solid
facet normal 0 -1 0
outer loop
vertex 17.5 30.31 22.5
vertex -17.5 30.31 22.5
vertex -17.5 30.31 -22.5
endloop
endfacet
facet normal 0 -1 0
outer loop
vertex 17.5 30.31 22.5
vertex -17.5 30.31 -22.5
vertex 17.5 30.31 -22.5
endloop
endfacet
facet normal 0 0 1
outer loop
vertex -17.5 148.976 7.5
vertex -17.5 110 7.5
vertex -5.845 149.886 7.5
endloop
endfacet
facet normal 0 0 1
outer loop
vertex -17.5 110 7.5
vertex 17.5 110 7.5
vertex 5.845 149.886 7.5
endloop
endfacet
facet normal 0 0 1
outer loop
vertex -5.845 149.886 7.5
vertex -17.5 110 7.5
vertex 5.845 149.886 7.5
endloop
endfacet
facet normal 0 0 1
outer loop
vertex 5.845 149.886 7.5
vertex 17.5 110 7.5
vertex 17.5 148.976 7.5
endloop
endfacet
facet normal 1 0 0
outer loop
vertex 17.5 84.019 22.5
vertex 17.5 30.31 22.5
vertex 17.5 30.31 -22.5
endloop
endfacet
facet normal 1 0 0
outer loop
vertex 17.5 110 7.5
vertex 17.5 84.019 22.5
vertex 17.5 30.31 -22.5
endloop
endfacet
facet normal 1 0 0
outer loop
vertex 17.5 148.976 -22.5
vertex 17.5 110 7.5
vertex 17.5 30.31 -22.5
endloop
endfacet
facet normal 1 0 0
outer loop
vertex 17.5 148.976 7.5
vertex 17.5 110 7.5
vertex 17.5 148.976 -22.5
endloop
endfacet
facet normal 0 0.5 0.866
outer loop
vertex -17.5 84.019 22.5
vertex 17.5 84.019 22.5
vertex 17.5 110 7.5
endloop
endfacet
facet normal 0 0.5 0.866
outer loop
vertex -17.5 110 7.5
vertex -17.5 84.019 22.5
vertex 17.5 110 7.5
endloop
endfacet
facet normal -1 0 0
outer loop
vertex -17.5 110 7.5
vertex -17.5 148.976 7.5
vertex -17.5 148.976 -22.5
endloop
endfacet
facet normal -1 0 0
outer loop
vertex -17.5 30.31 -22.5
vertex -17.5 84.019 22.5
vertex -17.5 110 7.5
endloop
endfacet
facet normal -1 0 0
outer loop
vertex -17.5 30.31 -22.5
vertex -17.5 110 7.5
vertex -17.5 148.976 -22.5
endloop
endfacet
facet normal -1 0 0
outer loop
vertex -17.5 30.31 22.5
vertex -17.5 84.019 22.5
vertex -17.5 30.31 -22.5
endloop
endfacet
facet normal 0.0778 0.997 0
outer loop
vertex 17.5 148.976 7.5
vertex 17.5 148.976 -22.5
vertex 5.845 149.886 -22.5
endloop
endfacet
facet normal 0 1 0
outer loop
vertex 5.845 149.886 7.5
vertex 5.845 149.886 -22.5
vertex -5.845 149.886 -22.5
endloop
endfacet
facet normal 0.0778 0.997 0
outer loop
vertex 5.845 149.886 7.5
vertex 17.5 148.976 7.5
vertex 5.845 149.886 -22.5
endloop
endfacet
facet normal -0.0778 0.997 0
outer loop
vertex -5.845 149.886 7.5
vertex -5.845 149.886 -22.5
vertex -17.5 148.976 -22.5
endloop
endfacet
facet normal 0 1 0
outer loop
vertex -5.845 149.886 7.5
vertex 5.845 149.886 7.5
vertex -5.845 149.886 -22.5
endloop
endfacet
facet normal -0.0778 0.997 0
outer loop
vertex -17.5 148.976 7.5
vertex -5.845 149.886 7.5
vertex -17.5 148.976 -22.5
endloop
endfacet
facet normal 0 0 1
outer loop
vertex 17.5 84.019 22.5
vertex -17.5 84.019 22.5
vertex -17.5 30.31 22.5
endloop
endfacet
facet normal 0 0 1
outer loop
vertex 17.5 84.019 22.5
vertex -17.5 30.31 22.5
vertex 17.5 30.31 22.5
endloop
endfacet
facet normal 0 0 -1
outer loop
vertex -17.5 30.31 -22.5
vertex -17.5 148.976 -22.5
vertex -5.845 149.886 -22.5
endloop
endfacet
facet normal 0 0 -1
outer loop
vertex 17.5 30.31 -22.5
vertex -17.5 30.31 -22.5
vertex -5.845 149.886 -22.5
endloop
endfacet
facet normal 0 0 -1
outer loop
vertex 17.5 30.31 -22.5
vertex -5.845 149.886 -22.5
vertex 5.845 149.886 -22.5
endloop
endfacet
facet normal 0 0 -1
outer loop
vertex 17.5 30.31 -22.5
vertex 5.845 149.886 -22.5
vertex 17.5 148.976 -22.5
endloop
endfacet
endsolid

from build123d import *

# Parameters (mm, degrees)
BOSS_EXTRUDE1_DEPTH = 22.5
CUT_EXTRUDE1_DEPTH  = 36


with BuildPart() as part:
    # Sketch1 → Boss-Extrude1 (new body, symmetric)
    with BuildSketch(Plane.XY):
        with BuildLine():
            Line((-17.5, 148.975669154), (-17.5, 30.31))
            Line((-17.5, 30.31), (17.5, 30.31))
            Line((17.5, 30.31), (17.5, 148.975669154))
            ThreePointArc((17.5, 148.975669154), (0, 150), (-17.5, 148.975669154))
        make_face()
    extrude(amount=BOSS_EXTRUDE1_DEPTH, both=True)

    # Sketch2 → Cut-Extrude1 (cut, through all)
    with BuildSketch(Plane(origin=(17.5, 0, 0), x_dir=(0, 0, -1), z_dir=(1, 0, 0))):
        Polygon((-22.5, 84.019237886), (-7.5, 110), (-7.5, 150), (-22.5, 150), align=None)
    extrude(amount=-CUT_EXTRUDE1_DEPTH, mode=Mode.SUBTRACT)


solid = part.part
